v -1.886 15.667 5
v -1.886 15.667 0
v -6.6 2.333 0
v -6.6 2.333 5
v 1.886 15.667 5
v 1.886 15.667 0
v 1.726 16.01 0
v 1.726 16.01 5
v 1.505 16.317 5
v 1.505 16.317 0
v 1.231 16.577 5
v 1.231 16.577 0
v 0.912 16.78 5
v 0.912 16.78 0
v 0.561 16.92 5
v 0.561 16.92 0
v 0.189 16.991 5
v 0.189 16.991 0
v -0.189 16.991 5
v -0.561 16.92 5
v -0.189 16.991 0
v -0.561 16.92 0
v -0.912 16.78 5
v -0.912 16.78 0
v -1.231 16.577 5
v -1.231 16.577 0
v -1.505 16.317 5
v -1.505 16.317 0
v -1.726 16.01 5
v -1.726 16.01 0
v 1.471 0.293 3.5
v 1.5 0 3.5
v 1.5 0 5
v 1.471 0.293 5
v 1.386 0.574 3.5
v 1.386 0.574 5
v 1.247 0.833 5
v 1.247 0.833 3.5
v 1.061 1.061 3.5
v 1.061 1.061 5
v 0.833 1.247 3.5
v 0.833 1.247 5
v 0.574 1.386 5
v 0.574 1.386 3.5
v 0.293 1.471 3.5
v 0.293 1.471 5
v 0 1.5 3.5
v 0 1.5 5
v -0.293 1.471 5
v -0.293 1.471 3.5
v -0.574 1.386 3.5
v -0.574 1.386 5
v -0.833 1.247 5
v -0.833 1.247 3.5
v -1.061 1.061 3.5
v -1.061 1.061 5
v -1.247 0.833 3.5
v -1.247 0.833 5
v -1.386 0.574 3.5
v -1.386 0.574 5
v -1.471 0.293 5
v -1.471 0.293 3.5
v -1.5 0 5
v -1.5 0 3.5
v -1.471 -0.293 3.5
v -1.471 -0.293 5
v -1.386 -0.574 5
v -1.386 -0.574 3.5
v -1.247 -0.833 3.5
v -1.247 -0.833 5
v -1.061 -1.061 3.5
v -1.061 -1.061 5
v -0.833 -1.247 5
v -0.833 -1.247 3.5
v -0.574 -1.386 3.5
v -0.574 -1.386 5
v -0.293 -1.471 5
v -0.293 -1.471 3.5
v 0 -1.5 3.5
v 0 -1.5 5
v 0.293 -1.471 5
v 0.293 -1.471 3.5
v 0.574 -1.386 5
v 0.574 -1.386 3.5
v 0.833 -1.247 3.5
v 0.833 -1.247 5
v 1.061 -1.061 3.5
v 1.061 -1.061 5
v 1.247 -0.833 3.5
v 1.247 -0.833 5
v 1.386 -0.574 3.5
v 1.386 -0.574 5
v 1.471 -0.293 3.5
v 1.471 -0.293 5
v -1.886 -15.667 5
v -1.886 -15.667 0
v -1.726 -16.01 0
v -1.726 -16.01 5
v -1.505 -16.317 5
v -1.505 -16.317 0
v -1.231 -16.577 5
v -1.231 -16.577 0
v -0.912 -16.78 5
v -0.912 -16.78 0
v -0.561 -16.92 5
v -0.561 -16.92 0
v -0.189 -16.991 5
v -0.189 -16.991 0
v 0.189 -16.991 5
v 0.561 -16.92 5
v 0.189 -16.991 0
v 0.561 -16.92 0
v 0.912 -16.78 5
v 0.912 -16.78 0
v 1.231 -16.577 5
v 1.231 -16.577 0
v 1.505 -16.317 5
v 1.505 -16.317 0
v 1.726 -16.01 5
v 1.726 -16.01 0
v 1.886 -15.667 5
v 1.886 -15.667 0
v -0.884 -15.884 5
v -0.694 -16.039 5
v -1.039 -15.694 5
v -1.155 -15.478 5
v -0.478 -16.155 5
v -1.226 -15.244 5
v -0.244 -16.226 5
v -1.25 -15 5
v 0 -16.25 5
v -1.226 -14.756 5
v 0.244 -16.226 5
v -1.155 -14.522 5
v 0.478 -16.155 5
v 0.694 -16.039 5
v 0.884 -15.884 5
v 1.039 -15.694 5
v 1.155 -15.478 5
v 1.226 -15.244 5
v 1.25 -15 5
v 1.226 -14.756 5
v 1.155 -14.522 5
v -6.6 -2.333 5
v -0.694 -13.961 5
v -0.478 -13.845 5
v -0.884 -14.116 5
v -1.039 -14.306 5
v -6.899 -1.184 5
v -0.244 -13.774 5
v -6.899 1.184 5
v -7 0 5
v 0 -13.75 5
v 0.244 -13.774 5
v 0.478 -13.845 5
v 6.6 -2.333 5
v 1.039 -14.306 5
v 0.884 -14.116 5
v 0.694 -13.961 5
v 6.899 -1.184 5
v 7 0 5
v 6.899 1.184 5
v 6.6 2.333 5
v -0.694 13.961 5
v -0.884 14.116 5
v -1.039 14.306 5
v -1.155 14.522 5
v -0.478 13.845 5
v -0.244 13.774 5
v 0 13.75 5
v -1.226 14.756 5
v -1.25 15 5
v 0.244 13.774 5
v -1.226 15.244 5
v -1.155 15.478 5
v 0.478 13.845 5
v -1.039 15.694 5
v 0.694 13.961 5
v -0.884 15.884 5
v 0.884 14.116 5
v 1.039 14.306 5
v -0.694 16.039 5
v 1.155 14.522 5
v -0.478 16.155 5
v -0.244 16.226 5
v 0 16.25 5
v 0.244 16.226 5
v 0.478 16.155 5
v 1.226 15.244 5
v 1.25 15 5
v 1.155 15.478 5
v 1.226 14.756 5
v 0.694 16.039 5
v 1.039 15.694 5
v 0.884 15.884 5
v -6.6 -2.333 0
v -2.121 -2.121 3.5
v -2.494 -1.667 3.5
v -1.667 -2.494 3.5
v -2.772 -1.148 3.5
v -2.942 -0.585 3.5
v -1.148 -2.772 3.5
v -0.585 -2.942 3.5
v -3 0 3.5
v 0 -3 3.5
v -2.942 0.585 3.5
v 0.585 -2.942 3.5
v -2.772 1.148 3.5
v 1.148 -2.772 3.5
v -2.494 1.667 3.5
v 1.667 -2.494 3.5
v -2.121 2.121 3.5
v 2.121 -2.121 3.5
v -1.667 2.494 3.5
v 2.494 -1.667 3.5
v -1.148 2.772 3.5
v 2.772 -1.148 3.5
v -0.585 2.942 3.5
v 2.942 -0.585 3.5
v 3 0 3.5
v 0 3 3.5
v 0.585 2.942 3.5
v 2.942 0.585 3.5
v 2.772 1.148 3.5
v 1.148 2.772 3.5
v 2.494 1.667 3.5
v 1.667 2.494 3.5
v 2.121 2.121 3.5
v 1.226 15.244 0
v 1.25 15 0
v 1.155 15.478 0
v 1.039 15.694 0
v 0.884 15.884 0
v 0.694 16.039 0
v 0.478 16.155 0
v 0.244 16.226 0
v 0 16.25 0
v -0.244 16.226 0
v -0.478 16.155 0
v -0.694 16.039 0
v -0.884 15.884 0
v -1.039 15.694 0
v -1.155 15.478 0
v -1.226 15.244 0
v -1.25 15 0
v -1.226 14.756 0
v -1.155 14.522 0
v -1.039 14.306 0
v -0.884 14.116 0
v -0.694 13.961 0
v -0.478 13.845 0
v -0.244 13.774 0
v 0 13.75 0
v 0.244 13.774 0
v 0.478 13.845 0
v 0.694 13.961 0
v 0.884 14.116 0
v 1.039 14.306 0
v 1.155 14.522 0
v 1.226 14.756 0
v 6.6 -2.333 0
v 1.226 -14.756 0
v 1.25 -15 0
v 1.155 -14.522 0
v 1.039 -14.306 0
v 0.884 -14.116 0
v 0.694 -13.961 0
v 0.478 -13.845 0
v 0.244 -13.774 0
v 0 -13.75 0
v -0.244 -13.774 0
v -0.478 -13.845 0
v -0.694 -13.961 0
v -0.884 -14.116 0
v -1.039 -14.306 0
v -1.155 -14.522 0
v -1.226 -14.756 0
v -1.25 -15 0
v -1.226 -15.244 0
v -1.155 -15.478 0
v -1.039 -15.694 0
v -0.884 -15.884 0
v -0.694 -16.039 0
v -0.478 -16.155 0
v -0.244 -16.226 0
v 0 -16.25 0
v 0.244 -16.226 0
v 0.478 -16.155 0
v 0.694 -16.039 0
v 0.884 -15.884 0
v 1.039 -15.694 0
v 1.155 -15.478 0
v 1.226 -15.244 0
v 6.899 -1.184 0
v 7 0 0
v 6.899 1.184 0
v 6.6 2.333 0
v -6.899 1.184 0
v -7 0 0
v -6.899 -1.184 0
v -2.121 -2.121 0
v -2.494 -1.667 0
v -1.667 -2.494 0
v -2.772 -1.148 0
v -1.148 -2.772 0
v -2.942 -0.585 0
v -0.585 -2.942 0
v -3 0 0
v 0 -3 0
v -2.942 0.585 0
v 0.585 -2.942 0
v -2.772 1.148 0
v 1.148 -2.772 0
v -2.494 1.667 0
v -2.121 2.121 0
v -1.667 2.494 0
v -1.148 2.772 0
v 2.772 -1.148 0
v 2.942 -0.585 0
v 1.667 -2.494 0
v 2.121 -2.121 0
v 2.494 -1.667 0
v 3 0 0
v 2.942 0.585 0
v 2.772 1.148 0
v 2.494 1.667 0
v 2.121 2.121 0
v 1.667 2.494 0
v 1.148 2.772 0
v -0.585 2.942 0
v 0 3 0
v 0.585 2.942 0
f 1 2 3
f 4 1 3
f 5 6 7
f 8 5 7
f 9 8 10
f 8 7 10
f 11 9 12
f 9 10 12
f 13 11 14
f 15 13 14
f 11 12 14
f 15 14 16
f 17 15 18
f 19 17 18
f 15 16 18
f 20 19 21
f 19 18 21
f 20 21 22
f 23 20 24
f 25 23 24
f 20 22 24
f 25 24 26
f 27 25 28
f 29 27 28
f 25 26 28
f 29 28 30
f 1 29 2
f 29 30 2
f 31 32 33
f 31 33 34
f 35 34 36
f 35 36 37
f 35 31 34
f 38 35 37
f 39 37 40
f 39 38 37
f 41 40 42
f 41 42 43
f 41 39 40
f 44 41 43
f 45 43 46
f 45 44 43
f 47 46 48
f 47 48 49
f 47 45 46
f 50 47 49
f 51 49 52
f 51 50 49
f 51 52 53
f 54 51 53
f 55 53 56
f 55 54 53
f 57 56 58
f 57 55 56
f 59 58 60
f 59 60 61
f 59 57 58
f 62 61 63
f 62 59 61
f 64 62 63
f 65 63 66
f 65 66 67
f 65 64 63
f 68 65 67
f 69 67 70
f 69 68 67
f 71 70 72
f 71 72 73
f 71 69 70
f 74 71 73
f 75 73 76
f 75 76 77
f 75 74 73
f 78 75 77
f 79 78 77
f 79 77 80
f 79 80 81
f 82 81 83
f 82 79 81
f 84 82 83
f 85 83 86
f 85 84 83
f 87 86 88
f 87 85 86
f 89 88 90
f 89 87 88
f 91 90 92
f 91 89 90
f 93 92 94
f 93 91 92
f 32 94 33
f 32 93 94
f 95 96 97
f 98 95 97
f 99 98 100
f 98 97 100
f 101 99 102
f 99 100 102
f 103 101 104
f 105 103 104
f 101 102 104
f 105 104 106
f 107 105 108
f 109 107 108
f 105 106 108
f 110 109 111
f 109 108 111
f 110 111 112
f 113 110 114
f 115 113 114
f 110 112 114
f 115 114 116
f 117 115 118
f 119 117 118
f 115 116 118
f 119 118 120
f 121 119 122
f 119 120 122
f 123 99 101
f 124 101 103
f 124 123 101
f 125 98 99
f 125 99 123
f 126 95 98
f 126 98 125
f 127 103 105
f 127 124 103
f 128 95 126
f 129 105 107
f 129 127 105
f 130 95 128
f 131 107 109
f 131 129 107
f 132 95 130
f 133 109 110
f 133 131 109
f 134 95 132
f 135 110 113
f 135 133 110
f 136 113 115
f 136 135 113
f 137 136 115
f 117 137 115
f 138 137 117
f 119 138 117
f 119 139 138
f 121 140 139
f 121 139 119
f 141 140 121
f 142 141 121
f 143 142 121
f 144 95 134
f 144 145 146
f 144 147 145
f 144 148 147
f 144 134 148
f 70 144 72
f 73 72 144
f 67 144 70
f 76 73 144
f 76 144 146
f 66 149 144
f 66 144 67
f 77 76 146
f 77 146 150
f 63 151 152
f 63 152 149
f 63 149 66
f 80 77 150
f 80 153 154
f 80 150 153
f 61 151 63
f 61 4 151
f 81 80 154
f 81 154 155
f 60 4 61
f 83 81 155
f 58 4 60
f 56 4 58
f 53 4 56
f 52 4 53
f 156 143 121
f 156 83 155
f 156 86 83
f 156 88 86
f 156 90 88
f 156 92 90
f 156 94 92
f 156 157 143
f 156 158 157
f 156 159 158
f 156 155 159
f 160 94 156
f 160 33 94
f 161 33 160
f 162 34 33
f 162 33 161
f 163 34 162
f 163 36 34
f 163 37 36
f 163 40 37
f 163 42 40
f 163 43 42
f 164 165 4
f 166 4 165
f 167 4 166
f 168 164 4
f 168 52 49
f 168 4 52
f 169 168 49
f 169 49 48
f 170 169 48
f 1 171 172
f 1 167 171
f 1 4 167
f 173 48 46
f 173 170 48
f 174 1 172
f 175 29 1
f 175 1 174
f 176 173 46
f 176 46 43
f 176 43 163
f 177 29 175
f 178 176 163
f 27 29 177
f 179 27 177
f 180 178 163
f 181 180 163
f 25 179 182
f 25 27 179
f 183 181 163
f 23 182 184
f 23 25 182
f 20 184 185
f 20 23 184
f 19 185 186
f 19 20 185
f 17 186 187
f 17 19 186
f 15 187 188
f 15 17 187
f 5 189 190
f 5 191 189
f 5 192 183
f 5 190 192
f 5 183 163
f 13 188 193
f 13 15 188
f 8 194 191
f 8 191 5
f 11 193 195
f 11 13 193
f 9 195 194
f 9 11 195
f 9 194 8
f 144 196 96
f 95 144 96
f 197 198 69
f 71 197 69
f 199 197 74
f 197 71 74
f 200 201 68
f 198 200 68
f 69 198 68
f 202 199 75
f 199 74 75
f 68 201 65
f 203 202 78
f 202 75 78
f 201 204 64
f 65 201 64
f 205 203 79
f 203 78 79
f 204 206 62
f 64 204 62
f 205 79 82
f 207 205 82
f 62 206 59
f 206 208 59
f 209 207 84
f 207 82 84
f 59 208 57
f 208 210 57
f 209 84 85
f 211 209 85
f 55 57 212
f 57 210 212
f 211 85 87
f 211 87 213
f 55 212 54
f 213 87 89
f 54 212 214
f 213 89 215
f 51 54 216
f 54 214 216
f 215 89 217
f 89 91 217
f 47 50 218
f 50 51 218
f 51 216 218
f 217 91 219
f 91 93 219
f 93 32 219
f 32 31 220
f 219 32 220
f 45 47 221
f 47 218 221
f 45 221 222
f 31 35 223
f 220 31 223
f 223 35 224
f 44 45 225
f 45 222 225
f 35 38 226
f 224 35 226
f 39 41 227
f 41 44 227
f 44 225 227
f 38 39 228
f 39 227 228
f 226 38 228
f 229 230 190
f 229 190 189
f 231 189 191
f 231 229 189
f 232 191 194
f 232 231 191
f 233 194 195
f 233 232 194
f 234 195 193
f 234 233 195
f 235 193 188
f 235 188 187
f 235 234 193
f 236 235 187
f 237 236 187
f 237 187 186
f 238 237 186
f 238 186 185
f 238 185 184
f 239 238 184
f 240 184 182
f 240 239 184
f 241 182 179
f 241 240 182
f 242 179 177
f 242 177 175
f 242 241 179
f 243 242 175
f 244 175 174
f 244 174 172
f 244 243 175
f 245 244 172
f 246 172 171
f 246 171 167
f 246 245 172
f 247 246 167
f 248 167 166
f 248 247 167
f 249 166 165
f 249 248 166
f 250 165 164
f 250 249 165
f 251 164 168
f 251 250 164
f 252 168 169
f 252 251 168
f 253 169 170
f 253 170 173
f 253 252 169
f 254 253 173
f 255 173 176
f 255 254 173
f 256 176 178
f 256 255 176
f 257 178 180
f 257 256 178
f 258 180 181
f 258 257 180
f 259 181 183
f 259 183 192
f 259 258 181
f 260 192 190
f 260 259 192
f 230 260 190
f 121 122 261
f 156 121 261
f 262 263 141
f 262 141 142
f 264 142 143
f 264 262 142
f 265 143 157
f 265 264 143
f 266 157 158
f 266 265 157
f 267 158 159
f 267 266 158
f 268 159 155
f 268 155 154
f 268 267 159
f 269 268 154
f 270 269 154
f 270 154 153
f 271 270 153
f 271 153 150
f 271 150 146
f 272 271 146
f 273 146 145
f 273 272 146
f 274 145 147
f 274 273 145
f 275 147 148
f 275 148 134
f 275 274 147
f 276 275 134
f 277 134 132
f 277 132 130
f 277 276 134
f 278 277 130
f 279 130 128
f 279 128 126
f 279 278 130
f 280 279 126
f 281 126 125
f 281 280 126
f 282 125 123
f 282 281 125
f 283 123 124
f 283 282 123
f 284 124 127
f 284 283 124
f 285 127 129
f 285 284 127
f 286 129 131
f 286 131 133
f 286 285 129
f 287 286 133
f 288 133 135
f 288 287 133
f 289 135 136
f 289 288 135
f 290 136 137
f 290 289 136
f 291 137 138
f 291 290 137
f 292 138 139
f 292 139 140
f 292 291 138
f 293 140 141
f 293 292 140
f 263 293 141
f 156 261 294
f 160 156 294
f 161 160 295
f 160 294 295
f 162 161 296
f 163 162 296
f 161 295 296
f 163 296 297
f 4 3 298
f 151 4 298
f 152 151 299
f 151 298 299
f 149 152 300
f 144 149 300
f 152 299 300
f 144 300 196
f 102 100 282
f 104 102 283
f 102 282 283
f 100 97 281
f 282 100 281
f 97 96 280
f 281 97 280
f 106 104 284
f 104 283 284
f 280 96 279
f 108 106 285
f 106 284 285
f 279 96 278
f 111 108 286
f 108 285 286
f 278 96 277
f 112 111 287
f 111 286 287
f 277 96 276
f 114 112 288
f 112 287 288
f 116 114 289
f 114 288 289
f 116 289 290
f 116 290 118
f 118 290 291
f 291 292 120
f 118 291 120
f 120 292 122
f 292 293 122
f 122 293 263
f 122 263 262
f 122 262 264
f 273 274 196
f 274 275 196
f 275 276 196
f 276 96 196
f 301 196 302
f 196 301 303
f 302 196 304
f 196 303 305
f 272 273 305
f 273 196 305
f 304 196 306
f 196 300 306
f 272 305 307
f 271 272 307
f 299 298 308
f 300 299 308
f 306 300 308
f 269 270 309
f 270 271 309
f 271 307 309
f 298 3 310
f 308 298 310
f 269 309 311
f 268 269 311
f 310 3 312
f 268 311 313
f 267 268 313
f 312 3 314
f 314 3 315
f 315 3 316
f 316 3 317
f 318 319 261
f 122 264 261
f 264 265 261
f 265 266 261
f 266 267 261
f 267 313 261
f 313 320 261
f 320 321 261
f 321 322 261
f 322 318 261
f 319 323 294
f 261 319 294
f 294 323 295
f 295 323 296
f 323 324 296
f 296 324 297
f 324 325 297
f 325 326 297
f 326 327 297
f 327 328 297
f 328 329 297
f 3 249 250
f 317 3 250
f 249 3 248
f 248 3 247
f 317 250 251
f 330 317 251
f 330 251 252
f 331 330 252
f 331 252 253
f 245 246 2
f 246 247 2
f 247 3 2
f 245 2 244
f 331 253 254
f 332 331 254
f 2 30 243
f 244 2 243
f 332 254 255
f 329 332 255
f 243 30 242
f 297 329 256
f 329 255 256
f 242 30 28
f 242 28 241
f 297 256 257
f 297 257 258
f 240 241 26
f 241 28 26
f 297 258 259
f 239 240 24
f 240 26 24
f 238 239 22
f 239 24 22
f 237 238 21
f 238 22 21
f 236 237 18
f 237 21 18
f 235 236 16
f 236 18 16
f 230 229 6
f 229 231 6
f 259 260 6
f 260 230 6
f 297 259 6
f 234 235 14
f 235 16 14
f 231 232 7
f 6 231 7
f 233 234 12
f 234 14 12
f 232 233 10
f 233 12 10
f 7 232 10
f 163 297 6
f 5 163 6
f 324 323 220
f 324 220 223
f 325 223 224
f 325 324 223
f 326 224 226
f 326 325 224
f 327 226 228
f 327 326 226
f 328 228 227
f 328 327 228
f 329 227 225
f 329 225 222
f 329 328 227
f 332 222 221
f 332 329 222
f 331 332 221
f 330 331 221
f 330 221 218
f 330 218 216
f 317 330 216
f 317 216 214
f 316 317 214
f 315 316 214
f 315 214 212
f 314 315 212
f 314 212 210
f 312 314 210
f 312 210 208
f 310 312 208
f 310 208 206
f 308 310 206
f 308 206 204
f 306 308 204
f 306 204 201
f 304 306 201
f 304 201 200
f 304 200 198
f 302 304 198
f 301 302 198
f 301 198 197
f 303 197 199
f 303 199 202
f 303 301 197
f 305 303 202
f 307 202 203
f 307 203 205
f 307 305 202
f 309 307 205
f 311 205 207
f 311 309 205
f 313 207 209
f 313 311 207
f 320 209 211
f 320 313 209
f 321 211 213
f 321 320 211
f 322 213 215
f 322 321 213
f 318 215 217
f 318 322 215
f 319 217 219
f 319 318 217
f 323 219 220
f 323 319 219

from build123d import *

# Parameters (mm, degrees)
SKETCH1_R           = 3
SKETCH1_R_2         = 1.25
BOSS_EXTRUDE1_DEPTH = 5
BOSS_EXTRUDE2_START = -1.5
SKETCH2_R           = 3
SKETCH2_R_2         = 1.5
BOSS_EXTRUDE2_DEPTH = 1.5


with BuildPart() as part:
    # Sketch1 → Boss-Extrude1 (new body)
    with BuildSketch(Plane.XY):
        with BuildLine():
            Line((-6.599663291, -2.333333333), (-1.885618083, -15.666666667))
            ThreePointArc((-1.885618083, -15.666666667), (0, -17), (1.885618083, -15.666666667))
            Line((1.885618083, -15.666666667), (6.599663291, -2.333333333))
            ThreePointArc((6.599663291, -2.333333333), (7, 0), (6.599663291, 2.333333333))
            Line((6.599663291, 2.333333333), (1.885618083, 15.666666667))
            ThreePointArc((1.885618083, 15.666666667), (0, 17), (-1.885618083, 15.666666667))
            Line((-1.885618083, 15.666666667), (-6.599663291, 2.333333333))
            ThreePointArc((-6.599663291, 2.333333333), (-7, 0), (-6.599663291, -2.333333333))
        make_face()
        Circle(SKETCH1_R, mode=Mode.SUBTRACT)
        with Locations((0, 15)):
            Circle(SKETCH1_R_2, mode=Mode.SUBTRACT)
        with Locations((0, -15)):
            Circle(SKETCH1_R_2, mode=Mode.SUBTRACT)
    extrude(amount=BOSS_EXTRUDE1_DEPTH)

    # Sketch2 → Boss-Extrude2 (add)
    with BuildSketch(Plane.XY.offset(5).offset(BOSS_EXTRUDE2_START)):
        Circle(SKETCH2_R)
        Circle(SKETCH2_R_2, mode=Mode.SUBTRACT)
    extrude(amount=BOSS_EXTRUDE2_DEPTH)


solid = part.part
